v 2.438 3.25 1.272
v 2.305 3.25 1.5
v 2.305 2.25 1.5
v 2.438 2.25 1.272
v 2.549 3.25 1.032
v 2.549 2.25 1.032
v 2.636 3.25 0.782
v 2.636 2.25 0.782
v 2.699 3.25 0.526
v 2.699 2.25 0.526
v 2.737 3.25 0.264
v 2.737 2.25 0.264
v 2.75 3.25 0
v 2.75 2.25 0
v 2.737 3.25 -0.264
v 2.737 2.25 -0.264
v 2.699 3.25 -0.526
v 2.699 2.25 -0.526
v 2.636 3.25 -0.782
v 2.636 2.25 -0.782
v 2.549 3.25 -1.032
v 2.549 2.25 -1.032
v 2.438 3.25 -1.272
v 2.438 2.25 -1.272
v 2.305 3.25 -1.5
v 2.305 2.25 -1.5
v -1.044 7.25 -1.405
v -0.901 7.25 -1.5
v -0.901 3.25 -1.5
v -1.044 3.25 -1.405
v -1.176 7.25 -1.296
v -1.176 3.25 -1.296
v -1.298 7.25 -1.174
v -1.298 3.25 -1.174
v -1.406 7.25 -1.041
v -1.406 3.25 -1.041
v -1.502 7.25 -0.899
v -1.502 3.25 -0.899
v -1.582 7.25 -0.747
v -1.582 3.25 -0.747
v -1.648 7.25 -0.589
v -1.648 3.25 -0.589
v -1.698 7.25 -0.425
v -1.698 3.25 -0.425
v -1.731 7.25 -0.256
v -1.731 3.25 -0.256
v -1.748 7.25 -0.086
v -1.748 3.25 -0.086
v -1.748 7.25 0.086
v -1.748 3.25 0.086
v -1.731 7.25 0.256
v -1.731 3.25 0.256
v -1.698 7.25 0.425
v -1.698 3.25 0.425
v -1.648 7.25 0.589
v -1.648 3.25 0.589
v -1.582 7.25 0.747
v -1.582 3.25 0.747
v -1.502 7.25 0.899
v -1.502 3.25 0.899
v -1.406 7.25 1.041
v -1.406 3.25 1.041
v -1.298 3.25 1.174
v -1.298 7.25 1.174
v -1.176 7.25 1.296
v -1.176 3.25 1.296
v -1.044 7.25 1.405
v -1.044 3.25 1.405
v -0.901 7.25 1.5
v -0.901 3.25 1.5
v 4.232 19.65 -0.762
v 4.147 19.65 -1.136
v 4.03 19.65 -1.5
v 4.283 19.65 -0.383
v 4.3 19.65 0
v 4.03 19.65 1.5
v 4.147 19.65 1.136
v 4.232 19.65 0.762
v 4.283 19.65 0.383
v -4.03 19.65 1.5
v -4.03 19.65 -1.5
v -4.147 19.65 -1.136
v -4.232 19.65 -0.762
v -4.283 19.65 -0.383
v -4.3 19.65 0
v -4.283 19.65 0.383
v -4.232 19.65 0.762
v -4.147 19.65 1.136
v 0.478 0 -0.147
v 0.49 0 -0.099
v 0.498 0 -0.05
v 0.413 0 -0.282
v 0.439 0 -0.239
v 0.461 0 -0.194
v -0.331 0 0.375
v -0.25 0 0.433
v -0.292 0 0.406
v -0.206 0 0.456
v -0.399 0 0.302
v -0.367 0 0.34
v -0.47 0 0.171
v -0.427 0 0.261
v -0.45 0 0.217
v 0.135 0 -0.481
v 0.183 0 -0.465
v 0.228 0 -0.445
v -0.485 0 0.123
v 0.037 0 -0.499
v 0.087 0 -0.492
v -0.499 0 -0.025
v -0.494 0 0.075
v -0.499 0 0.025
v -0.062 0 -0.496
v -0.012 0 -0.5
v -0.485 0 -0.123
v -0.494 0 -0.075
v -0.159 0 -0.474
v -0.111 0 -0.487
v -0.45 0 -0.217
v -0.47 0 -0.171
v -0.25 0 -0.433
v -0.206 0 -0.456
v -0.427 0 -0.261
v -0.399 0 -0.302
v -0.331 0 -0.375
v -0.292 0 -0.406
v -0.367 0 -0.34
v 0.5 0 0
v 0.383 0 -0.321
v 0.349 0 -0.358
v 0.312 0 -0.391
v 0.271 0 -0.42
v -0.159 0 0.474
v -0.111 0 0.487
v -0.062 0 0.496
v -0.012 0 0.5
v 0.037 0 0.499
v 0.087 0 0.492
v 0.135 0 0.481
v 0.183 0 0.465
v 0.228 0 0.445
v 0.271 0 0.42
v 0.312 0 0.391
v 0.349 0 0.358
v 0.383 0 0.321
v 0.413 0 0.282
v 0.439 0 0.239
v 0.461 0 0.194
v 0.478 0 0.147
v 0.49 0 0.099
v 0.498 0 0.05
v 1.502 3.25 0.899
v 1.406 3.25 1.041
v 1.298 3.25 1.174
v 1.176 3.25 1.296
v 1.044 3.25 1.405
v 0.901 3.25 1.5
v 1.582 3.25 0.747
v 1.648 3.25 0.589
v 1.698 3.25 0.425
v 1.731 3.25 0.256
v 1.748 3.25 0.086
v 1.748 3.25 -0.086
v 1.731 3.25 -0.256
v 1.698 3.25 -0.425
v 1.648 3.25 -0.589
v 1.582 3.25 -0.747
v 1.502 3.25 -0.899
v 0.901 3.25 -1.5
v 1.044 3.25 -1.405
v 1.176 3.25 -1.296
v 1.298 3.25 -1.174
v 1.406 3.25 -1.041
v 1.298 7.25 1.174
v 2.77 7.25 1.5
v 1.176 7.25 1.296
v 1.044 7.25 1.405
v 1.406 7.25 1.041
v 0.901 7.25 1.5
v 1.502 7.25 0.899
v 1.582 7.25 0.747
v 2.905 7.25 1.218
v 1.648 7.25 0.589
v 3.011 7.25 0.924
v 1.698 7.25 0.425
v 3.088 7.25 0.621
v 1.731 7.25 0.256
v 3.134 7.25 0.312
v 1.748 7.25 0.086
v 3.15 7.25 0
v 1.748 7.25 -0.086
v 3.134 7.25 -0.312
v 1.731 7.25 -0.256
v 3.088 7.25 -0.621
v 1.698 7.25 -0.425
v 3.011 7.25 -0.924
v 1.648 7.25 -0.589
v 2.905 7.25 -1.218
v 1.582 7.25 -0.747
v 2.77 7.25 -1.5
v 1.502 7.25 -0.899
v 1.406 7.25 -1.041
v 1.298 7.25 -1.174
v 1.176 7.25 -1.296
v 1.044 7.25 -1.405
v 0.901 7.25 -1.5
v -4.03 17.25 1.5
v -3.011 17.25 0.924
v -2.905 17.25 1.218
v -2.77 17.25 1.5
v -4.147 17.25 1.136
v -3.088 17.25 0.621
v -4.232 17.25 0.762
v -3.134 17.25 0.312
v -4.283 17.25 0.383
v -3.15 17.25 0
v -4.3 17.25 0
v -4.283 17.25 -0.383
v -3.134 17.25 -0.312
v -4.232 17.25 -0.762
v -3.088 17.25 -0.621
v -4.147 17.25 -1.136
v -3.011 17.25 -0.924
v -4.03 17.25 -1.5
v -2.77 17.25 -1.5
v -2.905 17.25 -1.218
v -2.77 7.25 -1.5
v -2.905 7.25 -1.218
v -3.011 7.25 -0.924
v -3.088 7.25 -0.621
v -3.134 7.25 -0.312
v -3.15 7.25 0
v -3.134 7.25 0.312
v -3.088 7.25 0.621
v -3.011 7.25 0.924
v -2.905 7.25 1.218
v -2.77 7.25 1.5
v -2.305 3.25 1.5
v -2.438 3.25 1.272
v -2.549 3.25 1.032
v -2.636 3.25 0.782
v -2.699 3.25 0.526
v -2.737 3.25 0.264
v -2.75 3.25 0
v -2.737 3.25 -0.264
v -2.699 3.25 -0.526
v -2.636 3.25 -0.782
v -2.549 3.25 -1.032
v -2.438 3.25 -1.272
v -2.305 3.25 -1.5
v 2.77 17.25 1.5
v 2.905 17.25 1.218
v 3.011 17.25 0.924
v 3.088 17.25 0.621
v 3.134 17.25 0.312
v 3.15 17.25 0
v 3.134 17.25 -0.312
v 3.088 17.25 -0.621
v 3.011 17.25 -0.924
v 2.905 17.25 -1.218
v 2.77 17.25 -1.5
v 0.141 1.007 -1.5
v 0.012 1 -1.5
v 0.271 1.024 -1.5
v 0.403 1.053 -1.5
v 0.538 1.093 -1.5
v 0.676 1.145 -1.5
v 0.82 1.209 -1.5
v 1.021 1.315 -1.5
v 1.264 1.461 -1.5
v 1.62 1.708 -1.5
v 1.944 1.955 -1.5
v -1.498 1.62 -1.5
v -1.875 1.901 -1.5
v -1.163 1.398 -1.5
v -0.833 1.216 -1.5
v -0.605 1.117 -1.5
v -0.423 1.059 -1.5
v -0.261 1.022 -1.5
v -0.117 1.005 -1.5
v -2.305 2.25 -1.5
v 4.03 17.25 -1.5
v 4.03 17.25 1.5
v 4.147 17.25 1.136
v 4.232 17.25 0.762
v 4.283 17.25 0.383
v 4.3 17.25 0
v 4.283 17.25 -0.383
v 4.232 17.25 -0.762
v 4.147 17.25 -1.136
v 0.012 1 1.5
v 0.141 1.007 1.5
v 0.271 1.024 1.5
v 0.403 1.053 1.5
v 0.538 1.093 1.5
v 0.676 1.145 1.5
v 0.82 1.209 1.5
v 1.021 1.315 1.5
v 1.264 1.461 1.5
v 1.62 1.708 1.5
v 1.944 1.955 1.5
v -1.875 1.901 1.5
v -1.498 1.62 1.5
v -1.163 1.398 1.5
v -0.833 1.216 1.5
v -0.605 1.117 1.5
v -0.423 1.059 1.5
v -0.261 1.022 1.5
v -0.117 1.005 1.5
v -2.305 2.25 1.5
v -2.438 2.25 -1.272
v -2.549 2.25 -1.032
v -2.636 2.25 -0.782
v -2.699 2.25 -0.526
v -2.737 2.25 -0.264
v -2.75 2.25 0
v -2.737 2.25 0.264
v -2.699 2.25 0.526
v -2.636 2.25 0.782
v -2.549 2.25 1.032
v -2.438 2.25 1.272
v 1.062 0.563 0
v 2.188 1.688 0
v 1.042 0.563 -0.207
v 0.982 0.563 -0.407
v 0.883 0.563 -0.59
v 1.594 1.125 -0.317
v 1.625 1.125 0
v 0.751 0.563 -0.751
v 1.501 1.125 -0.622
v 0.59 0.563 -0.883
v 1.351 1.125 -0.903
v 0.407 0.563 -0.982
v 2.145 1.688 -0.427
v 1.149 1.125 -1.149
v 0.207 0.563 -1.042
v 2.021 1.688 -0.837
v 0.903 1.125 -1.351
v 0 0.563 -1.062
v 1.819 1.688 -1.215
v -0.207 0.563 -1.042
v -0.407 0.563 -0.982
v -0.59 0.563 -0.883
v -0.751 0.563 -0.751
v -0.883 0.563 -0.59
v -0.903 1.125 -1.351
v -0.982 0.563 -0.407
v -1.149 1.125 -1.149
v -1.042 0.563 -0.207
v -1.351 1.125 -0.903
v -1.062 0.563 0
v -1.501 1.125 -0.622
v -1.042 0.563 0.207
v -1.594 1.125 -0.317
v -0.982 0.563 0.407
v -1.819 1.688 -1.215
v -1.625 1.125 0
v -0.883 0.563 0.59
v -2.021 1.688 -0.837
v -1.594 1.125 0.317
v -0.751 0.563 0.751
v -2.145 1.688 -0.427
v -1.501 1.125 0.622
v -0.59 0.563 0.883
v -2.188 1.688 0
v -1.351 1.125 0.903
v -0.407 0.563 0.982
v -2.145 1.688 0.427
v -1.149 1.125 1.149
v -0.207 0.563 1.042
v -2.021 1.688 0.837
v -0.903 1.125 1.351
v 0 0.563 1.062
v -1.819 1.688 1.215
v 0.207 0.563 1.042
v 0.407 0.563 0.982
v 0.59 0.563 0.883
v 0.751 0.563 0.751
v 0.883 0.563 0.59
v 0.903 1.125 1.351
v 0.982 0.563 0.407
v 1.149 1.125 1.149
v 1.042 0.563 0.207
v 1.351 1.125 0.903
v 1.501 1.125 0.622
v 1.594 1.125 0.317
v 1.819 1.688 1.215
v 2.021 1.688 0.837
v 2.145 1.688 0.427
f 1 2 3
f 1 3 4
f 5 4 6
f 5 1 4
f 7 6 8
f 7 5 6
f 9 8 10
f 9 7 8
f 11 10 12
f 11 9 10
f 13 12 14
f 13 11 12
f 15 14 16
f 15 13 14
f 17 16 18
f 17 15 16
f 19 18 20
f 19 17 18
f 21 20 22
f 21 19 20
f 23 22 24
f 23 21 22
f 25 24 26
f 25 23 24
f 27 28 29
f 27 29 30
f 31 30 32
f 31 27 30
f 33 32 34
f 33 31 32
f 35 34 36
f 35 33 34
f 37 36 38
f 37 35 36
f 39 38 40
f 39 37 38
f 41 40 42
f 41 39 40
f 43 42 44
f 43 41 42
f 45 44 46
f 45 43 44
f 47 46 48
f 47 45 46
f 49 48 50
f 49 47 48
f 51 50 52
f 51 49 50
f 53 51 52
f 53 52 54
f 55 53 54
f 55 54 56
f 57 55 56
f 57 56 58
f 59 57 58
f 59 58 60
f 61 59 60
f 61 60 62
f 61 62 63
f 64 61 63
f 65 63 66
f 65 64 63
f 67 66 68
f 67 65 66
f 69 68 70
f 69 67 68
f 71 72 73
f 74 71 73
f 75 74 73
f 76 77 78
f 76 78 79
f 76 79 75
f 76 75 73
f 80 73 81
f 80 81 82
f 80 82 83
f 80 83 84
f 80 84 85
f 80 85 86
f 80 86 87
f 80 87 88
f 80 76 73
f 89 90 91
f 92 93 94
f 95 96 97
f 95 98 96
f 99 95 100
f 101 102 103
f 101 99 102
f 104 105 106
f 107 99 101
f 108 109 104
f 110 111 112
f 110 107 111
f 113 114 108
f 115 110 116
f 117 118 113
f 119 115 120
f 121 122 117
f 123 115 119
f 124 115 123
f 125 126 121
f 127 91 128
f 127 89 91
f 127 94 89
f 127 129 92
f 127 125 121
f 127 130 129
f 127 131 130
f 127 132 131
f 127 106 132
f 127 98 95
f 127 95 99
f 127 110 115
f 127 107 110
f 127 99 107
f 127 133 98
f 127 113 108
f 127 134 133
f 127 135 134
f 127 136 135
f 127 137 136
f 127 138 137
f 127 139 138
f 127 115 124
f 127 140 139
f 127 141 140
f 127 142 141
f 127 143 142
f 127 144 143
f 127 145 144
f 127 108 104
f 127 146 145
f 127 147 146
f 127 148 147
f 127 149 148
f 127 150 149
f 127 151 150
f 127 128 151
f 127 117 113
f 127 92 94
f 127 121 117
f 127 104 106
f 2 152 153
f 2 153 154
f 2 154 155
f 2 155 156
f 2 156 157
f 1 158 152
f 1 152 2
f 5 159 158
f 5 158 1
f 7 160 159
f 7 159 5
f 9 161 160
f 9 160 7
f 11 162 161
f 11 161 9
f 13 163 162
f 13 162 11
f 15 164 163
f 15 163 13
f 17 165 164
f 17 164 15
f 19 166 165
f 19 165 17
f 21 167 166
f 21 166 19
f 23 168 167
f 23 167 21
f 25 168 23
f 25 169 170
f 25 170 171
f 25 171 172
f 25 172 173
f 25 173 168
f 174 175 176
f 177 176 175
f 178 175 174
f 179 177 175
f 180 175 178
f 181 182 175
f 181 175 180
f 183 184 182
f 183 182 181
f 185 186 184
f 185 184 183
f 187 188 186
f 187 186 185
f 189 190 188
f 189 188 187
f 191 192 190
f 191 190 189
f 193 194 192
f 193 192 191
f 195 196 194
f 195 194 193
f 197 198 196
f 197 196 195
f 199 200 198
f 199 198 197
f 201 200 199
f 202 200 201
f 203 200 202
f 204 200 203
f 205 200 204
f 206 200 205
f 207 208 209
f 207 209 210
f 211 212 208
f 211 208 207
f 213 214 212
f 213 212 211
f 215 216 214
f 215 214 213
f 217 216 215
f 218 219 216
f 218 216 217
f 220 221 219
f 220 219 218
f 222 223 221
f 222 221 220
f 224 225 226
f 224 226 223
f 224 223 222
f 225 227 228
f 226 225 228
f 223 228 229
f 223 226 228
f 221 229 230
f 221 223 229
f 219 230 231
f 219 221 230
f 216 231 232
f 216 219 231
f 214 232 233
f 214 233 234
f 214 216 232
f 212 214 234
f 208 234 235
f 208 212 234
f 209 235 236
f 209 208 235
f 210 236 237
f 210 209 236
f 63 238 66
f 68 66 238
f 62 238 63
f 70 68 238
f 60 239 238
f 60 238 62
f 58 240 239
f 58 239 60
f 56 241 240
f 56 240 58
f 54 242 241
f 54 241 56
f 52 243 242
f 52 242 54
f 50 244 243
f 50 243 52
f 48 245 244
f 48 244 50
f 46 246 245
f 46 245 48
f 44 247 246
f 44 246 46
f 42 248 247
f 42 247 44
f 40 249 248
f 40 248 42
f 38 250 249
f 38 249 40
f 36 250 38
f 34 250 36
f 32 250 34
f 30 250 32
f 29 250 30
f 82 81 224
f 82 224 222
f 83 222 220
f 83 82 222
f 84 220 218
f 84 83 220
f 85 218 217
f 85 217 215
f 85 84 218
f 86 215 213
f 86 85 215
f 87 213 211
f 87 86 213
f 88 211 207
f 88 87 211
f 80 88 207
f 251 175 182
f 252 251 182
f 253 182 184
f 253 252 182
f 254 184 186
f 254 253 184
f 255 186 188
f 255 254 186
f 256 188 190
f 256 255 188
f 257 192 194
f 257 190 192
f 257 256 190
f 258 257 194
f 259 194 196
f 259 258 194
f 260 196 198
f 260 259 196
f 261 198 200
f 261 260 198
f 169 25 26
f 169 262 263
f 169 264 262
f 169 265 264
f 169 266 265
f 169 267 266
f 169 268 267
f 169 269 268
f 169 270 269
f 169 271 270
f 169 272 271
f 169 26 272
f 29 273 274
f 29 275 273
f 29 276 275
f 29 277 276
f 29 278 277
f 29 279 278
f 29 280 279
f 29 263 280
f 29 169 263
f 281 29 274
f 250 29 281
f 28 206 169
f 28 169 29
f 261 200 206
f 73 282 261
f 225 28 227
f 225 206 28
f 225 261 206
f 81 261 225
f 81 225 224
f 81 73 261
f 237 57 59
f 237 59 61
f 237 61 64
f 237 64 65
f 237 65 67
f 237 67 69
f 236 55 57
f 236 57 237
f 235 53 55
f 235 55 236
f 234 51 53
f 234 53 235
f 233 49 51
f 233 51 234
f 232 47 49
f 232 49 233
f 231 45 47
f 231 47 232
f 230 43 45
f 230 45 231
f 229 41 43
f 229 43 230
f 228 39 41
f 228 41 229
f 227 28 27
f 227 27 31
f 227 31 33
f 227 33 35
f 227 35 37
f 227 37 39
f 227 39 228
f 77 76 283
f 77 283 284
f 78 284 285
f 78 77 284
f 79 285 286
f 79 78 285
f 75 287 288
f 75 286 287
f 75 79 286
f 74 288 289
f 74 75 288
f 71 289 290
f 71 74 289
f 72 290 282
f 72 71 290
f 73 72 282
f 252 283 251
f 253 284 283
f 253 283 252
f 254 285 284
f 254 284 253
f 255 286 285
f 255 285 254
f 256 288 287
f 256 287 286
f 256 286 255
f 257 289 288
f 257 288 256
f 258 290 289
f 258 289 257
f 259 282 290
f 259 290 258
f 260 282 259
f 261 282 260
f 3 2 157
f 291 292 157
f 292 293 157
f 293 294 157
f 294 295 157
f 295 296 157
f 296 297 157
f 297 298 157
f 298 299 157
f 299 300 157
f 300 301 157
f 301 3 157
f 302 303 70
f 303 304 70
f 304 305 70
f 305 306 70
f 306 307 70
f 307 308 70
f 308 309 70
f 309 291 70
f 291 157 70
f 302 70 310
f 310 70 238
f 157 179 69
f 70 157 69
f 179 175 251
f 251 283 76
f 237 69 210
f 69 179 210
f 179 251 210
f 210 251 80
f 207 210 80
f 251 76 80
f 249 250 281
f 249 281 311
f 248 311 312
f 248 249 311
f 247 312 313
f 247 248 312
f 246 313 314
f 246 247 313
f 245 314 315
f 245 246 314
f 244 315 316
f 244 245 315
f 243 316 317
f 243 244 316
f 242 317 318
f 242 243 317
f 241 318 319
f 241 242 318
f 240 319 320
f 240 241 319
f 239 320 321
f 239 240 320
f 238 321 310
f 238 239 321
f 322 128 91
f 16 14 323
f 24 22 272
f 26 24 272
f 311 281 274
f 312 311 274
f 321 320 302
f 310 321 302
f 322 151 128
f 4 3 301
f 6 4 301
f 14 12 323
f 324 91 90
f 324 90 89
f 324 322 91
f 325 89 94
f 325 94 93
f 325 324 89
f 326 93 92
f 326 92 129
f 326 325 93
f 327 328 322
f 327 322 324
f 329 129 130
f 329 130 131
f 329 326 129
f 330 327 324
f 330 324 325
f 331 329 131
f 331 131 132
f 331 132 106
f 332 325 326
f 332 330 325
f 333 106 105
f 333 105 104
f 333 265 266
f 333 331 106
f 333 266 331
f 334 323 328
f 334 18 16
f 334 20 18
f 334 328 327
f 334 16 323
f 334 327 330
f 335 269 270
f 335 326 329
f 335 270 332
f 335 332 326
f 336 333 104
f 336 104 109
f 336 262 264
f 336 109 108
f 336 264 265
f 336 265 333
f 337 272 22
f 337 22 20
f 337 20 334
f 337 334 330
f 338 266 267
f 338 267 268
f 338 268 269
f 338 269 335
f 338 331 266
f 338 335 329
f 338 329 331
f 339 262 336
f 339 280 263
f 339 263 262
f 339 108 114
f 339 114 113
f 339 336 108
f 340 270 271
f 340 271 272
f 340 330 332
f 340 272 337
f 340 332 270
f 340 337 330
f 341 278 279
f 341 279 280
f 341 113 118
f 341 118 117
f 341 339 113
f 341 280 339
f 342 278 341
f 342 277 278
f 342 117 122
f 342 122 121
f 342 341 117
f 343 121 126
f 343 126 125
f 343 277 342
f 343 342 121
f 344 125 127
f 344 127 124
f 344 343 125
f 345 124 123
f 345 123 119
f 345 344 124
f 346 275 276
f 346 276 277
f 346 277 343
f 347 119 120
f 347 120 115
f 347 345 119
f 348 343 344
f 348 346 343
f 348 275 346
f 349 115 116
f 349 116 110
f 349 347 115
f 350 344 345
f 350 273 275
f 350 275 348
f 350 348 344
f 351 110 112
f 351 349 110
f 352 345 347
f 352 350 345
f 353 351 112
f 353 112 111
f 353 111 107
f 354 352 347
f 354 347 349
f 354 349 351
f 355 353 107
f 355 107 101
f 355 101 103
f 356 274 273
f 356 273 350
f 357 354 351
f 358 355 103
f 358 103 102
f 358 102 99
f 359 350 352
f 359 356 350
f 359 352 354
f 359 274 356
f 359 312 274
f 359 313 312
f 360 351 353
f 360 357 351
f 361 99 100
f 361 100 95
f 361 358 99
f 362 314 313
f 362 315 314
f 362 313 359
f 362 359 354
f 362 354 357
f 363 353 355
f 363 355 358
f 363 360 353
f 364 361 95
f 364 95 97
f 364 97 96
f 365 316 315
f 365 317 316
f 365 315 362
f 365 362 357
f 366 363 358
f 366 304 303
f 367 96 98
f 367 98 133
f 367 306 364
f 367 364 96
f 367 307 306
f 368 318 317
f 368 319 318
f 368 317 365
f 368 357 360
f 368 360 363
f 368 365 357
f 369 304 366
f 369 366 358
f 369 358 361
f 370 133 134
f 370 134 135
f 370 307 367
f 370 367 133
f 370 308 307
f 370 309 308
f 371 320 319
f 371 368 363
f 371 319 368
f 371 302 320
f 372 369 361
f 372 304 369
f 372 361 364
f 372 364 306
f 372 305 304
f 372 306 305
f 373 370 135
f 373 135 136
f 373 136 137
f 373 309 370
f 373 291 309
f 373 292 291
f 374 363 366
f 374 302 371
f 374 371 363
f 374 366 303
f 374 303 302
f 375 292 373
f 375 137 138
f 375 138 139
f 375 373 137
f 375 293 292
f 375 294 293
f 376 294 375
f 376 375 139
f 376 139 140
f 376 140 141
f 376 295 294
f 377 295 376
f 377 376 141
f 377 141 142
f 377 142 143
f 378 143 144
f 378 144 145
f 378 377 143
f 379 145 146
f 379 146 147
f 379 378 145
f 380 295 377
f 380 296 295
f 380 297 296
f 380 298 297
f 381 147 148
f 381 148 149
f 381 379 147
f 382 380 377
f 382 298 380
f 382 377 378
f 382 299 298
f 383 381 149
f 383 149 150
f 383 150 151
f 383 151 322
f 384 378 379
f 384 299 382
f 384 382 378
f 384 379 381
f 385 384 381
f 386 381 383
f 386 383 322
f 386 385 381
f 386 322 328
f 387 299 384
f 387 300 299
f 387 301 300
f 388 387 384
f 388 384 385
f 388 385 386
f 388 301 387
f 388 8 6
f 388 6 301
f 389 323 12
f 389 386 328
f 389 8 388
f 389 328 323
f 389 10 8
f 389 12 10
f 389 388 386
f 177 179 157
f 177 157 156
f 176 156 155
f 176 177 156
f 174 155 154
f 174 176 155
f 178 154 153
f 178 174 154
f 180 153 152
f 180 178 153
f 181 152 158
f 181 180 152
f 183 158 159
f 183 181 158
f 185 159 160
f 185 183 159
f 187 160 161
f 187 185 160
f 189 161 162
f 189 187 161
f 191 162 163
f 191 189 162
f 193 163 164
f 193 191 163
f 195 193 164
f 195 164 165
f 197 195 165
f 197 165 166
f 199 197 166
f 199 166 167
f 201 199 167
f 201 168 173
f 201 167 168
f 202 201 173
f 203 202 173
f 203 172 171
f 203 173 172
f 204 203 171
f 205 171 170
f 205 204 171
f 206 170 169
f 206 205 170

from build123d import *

# Parameters (mm, degrees)
F2_W     = 15
F2_H     = 3
F3_DEPTH = 25


with BuildPart() as f1:
    # F0 (on Top) → F1 (revolve)
    with BuildSketch(Plane.XY):
        Polygon((0, 19.65), (0, 0), (0.5, 0), (2.75, 2.25), (2.75, 3.25), (1.75, 3.25), (1.75, 7.25), (3.15, 7.25), (3.15, 17.25), (4.3, 17.25), (4.3, 19.65), align=None)
    revolve(axis=Axis((0, 9.825, 0), (0, 1, 0)))


with BuildPart() as f3:
    # F2 (on face) → F3 (new body)
    with BuildSketch(Plane(origin=(0, 19.65, 0), x_dir=(-1, 0, 0), z_dir=(0, 1, 0))):
        Rectangle(F2_W, F2_H)
    extrude(amount=-F3_DEPTH)

    # F4: intersect F1
    add(f1.part, mode=Mode.INTERSECT)


solid = f3.part
